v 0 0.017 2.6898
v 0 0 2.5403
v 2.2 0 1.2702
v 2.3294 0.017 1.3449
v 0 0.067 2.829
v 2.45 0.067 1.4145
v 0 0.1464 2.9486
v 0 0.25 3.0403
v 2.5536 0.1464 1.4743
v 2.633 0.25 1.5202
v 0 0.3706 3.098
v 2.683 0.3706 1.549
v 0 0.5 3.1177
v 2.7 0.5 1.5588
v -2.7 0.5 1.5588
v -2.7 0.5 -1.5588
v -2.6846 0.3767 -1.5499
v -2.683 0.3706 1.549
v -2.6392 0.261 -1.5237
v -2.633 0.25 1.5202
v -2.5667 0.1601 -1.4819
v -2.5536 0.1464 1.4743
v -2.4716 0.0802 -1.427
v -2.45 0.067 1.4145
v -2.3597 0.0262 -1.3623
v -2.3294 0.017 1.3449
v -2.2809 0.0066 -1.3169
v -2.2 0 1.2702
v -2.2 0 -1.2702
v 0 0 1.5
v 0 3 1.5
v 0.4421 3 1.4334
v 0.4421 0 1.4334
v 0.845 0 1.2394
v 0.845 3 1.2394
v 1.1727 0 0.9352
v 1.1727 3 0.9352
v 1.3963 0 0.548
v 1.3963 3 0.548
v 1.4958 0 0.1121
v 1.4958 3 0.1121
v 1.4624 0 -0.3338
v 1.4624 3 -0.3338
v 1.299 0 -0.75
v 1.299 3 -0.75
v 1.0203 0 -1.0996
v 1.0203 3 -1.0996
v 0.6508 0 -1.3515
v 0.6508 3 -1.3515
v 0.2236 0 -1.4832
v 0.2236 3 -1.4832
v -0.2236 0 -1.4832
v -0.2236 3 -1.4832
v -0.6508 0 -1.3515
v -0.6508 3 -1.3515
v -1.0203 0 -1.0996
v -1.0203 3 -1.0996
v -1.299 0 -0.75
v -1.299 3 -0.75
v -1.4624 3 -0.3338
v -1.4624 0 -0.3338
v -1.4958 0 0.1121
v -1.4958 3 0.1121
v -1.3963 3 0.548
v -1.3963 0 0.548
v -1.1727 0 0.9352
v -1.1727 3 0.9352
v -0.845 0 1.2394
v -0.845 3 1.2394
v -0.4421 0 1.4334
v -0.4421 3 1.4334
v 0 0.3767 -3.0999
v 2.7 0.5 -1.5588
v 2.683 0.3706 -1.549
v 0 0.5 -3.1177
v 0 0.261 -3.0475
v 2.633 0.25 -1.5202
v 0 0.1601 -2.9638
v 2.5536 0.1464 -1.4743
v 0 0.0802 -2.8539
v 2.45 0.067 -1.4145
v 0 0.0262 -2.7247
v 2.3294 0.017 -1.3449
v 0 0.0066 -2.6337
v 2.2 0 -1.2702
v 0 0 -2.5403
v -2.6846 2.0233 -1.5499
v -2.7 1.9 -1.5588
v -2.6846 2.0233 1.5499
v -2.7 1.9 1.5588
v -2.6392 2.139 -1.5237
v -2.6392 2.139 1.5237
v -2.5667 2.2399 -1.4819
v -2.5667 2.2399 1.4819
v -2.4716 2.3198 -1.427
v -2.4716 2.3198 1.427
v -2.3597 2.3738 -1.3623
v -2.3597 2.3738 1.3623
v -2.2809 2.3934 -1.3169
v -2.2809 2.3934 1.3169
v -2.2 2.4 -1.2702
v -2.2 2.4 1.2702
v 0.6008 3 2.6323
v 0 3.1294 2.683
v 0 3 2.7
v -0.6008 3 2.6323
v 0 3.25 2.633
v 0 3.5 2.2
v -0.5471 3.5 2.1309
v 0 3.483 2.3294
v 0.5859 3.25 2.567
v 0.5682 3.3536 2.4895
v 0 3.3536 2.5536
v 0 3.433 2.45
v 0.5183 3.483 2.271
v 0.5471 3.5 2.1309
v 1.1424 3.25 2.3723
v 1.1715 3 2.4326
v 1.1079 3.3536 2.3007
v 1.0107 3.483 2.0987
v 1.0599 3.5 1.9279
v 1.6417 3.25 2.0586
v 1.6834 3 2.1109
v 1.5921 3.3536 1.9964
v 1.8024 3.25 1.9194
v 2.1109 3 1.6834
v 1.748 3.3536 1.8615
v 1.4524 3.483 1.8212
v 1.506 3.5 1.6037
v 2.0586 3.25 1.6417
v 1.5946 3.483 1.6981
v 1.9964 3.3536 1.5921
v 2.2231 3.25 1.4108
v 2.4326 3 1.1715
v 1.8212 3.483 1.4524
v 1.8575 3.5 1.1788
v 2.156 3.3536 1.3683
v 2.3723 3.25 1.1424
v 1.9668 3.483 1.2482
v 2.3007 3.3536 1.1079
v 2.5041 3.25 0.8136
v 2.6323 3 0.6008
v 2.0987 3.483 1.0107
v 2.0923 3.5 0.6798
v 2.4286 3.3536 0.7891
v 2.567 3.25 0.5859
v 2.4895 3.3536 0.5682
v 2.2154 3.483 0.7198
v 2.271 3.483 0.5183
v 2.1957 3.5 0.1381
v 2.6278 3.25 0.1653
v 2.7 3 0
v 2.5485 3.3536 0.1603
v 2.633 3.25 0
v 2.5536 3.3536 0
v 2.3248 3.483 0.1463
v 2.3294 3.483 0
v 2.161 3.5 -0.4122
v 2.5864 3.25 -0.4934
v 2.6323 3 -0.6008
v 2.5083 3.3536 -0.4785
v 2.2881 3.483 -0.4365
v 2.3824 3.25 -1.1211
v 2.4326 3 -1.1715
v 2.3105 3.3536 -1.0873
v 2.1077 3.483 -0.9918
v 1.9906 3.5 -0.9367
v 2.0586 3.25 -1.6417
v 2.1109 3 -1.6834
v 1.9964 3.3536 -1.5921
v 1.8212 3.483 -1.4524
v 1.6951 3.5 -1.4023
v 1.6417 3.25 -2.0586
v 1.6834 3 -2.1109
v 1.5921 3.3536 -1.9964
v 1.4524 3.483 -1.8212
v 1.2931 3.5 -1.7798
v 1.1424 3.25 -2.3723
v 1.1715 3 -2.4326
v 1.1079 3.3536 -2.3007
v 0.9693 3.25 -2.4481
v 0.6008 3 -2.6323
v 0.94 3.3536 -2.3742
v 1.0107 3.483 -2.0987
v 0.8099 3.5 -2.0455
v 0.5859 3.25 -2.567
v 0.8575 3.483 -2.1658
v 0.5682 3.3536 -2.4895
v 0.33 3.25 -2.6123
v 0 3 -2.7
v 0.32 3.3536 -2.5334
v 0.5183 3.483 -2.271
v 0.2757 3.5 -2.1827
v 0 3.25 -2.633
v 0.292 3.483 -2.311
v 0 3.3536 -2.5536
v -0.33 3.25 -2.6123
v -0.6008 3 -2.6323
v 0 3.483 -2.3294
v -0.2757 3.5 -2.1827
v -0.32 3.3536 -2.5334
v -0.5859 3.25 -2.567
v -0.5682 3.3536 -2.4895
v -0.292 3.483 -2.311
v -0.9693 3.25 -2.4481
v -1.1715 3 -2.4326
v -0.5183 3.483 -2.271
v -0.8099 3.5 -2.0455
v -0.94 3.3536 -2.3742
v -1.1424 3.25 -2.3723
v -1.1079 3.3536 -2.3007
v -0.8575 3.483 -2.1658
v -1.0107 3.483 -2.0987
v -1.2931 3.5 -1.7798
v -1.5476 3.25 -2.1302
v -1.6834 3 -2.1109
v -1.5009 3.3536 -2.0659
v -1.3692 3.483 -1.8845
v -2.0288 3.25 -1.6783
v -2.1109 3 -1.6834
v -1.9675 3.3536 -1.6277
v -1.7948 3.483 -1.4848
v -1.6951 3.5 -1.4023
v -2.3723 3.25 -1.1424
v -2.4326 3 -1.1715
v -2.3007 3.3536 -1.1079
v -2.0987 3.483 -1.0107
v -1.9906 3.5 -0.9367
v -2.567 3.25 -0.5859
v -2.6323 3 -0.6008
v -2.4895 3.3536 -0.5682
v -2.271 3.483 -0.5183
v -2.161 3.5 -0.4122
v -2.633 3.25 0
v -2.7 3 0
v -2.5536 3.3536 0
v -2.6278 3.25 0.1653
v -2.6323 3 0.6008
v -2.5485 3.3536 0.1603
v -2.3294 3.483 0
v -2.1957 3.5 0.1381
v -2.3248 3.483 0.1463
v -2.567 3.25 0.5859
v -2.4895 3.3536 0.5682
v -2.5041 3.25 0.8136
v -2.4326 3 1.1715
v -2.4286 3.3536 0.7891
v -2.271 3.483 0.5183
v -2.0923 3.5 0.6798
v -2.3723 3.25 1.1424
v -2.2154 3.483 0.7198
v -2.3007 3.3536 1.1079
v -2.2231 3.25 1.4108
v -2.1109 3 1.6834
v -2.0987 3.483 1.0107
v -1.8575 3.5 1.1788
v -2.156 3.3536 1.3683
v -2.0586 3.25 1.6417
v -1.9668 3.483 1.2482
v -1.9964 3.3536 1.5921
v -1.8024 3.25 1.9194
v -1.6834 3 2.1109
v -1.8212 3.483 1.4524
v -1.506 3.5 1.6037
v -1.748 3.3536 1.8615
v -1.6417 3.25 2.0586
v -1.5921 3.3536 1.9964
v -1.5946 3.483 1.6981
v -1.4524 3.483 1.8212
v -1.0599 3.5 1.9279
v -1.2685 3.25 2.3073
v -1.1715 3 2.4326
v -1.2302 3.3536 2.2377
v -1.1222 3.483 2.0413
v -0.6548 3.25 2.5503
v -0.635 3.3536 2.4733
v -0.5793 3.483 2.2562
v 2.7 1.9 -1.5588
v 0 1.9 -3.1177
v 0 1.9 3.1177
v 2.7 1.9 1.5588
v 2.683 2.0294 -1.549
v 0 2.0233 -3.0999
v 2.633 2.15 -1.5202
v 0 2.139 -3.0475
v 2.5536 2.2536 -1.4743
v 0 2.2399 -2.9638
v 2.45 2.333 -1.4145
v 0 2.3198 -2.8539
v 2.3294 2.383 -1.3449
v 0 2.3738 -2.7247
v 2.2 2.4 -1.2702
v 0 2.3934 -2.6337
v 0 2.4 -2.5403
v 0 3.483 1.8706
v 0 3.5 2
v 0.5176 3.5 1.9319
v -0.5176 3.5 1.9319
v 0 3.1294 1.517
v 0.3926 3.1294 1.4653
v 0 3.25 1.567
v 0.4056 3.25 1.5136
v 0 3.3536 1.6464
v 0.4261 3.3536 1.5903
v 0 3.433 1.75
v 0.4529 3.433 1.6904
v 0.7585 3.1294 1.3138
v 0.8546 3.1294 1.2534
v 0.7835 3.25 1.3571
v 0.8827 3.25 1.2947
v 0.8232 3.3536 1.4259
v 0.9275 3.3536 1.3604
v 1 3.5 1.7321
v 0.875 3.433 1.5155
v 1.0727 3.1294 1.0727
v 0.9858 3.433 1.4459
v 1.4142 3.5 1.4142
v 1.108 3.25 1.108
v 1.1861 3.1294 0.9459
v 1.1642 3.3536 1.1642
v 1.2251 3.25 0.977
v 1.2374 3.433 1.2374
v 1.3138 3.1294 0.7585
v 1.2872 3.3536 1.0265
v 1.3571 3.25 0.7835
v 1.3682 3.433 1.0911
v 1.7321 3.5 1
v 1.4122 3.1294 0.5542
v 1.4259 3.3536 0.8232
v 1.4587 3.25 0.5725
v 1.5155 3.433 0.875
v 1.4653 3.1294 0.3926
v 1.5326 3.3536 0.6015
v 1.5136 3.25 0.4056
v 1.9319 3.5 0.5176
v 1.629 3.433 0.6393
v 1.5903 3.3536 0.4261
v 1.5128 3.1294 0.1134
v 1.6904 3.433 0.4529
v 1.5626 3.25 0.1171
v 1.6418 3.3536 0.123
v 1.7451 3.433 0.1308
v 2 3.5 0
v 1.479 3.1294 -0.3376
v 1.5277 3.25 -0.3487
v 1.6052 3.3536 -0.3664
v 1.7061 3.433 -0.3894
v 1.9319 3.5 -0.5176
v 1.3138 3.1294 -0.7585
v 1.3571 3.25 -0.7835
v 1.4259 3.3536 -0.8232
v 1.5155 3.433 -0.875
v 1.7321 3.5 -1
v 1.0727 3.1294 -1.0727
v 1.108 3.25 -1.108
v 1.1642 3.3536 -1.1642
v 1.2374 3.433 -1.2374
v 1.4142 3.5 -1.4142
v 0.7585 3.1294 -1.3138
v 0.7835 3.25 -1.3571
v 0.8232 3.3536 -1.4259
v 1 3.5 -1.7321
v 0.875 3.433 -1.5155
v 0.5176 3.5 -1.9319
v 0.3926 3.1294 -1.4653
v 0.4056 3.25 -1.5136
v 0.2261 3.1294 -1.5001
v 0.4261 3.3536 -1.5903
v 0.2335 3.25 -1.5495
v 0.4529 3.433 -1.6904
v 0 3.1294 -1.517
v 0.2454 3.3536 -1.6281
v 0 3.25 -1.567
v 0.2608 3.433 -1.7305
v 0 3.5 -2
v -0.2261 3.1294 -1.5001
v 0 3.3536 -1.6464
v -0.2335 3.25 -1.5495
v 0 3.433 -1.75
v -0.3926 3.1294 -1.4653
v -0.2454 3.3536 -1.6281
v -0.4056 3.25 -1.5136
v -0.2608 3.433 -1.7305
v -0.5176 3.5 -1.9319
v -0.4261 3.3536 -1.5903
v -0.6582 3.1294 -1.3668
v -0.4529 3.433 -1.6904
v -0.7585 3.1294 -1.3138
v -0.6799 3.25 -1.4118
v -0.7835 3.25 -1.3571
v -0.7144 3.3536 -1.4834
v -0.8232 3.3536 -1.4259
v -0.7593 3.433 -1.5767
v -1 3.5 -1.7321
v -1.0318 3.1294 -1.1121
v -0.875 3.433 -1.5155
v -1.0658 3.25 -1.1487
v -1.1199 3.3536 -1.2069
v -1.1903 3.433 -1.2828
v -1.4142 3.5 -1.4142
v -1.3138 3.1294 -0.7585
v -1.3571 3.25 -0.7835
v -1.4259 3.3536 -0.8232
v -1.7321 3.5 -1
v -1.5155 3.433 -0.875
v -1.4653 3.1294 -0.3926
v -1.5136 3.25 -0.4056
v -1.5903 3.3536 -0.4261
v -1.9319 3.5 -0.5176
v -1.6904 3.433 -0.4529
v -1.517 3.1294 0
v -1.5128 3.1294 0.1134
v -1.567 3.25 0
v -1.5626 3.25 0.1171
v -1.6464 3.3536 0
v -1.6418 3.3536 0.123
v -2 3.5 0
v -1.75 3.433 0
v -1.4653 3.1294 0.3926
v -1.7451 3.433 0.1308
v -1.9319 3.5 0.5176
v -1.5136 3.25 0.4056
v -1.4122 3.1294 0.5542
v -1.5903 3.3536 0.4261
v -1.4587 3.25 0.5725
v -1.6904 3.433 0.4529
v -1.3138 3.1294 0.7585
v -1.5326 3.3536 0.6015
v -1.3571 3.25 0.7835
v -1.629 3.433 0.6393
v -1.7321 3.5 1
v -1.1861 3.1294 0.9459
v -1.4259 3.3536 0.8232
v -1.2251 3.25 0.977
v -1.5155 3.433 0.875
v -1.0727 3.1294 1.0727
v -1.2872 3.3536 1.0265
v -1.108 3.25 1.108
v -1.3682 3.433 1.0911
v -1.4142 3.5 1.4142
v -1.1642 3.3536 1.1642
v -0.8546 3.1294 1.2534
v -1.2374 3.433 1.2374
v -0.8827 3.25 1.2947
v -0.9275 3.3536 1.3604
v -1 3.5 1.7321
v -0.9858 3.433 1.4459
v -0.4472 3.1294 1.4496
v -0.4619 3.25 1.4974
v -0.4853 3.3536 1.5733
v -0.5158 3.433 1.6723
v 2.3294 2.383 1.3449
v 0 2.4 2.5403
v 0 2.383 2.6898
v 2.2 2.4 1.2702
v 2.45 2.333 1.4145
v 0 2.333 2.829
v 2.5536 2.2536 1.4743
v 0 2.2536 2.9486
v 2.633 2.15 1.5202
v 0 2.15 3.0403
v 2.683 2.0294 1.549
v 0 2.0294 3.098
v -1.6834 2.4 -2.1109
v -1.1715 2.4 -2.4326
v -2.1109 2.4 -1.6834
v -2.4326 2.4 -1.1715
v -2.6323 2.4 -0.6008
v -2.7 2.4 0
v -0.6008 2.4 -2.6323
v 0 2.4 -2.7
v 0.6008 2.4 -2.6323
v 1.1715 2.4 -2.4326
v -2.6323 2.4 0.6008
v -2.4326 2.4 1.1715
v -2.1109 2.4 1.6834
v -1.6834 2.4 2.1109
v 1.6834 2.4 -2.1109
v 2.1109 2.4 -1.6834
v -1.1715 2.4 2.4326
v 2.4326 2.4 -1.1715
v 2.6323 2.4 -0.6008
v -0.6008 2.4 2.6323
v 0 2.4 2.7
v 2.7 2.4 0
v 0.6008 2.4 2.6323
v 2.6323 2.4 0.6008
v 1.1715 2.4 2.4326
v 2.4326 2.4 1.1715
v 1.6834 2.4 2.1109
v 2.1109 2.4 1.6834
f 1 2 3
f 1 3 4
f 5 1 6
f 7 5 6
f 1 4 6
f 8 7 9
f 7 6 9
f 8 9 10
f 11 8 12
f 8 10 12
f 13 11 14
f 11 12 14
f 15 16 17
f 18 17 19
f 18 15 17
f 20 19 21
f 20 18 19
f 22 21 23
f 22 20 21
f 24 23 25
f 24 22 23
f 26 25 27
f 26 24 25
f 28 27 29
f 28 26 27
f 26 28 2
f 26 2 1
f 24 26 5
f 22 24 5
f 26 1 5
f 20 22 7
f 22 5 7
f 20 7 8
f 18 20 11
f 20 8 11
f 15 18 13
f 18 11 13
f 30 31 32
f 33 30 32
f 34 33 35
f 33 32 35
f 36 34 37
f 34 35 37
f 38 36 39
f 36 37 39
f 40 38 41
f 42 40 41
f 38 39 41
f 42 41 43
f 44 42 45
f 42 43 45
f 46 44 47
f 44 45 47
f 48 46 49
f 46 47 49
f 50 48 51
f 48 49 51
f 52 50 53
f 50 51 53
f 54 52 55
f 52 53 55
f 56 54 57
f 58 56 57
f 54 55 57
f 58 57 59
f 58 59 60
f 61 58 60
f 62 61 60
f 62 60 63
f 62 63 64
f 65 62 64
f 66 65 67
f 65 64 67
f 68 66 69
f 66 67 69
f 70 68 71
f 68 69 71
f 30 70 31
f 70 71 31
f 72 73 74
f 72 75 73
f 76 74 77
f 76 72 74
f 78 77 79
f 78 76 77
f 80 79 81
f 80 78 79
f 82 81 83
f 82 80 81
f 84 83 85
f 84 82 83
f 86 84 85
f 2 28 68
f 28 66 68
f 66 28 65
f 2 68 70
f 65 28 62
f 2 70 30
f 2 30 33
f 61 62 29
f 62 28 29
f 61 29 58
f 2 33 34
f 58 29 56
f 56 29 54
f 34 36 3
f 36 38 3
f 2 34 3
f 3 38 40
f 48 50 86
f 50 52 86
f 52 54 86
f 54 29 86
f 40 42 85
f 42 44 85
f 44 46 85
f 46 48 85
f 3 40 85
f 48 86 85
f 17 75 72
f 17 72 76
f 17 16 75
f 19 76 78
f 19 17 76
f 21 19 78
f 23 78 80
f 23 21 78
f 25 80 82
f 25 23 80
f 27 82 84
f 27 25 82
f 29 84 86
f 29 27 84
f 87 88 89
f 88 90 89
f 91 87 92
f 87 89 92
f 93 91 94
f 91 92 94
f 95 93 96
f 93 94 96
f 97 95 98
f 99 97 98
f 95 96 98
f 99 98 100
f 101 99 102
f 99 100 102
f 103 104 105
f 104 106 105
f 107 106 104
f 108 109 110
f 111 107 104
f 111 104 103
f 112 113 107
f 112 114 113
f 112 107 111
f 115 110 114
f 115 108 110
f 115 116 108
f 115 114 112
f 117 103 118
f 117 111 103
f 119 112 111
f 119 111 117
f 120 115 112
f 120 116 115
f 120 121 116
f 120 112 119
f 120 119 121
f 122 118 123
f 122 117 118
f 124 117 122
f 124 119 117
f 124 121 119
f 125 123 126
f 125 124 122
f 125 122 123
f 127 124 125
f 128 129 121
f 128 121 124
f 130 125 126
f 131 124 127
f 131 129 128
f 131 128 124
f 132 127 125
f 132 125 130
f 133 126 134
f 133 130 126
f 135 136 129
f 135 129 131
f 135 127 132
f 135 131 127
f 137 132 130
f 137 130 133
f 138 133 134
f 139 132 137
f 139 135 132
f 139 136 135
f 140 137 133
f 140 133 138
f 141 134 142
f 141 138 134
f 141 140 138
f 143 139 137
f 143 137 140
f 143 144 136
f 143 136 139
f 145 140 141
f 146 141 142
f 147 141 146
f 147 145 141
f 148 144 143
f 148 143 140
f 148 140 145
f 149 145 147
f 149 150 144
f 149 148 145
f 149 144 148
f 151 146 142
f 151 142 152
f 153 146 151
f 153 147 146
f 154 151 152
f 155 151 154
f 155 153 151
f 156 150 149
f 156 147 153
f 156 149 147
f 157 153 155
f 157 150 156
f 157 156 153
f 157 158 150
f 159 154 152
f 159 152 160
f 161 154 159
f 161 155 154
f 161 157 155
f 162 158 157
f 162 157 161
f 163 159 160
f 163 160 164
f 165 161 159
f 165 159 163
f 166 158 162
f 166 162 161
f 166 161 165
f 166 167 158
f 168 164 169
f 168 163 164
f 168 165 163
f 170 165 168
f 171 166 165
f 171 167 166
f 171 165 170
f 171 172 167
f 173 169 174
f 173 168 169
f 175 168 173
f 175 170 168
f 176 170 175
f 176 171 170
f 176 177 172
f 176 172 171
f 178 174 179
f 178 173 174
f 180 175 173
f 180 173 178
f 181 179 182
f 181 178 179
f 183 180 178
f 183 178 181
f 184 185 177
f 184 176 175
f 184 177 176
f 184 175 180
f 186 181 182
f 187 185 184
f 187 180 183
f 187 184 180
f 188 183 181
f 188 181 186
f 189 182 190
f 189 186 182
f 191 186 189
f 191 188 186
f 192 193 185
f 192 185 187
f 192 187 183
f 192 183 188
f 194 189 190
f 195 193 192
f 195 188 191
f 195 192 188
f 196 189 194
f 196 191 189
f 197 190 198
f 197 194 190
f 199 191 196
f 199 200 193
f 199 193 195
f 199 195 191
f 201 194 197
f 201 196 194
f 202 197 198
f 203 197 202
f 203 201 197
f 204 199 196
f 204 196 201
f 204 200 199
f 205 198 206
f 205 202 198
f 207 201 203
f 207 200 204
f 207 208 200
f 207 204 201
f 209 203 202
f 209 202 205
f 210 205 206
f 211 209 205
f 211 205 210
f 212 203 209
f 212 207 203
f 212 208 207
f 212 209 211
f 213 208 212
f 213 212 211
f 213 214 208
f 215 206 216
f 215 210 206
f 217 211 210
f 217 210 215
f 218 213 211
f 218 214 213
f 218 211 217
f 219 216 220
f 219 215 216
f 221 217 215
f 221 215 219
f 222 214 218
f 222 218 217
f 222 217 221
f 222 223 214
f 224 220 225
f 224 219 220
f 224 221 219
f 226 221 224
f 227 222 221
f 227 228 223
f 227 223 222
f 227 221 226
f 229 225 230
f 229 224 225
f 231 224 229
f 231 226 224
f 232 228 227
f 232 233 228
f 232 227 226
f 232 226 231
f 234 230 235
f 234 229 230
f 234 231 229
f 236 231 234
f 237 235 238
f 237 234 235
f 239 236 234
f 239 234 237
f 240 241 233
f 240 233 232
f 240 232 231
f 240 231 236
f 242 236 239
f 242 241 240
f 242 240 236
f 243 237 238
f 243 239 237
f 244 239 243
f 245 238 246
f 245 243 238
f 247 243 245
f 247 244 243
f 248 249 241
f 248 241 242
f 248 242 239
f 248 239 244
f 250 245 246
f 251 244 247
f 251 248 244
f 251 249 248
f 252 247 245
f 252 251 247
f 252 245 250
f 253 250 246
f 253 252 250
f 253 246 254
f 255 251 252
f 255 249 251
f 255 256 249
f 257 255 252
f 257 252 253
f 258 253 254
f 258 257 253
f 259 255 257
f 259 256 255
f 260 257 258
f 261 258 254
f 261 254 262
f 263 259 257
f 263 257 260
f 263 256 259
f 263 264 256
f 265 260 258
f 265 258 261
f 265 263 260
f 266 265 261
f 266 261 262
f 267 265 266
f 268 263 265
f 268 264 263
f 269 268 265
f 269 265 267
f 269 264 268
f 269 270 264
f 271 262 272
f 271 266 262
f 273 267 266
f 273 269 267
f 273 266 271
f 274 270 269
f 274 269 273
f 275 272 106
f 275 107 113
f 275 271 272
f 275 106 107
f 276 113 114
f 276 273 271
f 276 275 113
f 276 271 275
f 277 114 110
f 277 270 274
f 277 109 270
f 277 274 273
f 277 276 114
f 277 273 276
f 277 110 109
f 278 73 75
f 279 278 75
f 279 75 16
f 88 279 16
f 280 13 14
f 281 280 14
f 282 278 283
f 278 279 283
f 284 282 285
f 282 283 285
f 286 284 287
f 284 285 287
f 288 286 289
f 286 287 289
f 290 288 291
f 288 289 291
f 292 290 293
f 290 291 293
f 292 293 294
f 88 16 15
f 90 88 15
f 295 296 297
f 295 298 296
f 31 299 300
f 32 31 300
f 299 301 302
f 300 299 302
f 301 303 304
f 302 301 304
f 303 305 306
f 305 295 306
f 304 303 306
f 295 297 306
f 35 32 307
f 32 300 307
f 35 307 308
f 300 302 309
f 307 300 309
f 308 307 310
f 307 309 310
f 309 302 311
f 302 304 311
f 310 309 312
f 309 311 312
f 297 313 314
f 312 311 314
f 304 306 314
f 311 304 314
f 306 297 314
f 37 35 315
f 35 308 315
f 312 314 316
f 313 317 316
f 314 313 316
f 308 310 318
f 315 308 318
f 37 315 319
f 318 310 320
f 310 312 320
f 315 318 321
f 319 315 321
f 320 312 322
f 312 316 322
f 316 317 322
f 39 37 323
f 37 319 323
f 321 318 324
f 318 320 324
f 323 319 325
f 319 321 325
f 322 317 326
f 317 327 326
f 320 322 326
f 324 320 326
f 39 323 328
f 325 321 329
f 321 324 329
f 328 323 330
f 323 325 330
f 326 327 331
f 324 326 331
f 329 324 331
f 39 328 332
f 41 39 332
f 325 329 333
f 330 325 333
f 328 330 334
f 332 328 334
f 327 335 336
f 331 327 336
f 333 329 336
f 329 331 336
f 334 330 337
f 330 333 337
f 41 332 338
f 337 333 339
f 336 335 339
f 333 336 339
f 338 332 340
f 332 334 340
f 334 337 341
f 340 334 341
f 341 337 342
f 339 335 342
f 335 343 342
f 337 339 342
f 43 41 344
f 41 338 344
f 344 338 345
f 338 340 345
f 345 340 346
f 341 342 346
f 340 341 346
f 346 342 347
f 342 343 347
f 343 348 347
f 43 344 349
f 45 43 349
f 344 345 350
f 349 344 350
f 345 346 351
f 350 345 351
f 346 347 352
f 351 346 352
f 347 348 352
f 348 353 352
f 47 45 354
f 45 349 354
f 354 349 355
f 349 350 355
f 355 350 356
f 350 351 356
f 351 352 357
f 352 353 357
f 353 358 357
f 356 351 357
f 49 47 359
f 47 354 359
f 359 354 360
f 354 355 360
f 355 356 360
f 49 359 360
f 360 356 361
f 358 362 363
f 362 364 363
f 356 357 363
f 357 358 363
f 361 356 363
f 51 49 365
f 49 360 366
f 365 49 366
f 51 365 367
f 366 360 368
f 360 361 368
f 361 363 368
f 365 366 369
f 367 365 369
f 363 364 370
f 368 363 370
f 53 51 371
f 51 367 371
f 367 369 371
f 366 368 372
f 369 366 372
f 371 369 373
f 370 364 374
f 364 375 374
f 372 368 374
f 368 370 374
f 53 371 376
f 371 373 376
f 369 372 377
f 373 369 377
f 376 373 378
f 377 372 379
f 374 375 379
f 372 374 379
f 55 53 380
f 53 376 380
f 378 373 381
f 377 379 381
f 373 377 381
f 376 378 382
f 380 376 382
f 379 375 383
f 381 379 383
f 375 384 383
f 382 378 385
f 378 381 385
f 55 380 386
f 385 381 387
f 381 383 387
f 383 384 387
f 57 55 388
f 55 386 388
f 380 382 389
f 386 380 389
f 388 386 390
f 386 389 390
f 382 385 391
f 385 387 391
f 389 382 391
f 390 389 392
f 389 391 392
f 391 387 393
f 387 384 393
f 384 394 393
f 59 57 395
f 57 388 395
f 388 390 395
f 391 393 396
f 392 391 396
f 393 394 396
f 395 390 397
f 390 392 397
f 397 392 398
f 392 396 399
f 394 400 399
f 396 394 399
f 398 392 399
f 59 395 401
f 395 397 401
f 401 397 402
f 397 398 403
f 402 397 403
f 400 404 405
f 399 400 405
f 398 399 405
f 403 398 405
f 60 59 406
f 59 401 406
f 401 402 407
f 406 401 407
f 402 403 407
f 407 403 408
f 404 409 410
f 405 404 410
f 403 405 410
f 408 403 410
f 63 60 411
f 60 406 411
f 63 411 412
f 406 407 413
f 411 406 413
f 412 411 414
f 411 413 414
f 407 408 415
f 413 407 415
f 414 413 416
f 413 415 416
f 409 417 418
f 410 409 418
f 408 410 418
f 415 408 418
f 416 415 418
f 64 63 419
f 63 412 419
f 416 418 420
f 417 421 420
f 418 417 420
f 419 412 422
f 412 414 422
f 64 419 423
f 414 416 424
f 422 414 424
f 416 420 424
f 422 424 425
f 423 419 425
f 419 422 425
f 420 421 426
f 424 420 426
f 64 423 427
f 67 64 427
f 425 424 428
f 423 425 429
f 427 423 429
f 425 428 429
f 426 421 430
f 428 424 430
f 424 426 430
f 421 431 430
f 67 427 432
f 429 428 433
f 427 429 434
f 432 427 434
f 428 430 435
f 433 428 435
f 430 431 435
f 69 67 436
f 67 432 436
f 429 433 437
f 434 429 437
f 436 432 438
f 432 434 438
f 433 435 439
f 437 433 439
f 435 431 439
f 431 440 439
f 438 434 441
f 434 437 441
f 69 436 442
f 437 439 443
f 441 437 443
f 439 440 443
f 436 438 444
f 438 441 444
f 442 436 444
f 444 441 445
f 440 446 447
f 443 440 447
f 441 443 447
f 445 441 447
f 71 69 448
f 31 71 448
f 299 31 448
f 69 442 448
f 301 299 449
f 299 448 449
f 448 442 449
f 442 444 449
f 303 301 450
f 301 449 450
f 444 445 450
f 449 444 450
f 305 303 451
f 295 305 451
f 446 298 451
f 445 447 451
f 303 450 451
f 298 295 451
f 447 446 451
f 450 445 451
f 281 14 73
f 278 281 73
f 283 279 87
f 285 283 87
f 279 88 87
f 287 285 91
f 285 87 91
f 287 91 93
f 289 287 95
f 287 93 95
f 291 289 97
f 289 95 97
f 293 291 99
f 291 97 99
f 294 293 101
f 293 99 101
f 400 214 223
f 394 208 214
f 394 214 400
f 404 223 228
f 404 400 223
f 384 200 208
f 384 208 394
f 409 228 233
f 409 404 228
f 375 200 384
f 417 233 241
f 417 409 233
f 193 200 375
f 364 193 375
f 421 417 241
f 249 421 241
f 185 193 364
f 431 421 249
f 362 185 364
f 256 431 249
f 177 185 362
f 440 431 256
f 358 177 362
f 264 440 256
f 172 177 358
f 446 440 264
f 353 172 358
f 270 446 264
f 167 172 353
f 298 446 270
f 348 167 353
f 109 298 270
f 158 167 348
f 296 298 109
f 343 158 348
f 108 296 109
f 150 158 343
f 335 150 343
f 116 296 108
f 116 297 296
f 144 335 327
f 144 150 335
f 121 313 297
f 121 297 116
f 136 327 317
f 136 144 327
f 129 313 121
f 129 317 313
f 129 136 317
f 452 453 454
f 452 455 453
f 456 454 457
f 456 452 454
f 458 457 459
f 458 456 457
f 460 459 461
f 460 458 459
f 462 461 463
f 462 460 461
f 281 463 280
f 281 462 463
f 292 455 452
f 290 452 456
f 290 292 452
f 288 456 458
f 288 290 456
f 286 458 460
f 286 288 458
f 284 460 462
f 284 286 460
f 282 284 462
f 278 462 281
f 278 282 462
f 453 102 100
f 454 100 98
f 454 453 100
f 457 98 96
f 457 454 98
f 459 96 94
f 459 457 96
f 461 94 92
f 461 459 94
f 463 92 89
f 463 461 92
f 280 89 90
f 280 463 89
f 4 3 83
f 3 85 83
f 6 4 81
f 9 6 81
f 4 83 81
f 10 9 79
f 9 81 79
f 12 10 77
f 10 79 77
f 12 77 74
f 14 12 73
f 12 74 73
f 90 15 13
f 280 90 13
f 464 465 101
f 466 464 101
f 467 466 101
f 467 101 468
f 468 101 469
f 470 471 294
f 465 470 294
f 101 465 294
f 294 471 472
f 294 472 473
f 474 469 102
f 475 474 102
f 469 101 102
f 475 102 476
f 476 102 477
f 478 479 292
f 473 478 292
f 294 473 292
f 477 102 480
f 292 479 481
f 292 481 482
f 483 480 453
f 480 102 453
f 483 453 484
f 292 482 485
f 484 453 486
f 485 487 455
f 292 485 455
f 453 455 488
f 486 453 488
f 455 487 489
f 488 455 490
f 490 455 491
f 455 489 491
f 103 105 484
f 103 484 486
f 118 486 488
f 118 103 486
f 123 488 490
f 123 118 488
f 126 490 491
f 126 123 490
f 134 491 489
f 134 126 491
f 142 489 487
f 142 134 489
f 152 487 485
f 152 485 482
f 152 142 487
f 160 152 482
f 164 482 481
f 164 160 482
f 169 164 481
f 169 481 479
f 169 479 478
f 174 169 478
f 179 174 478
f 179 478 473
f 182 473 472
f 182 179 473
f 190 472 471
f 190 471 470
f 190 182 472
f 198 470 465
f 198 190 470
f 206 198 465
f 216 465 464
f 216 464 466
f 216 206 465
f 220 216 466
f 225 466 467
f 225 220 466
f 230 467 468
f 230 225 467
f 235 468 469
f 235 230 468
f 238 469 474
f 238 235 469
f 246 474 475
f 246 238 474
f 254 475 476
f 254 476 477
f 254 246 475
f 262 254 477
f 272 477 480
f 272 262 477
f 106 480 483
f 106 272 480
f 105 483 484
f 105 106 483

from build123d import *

# Parameters (mm, degrees)
EXTRUDE_1_DEPTH     = 2.4
SKETCH_2_R          = 1.5
CUT_EXTRUDE_1_DEPTH = 10
FILLET_1_R          = 0.5
EXTRUDE_START       = 1.1
SKETCH_3_R          = 2.7
SKETCH_3_R_2        = 1.5
EXTRUDE_2_DEPTH     = 1.1
FILLET_2_R          = 0.5


with BuildPart() as part:
    # 草图1 → 凸台-拉伸1 (new body)
    with BuildSketch(Plane(origin=(0, 0, 0), x_dir=(1, 0, 0), z_dir=(0, 1, 0))):
        Polygon((0, 3.117691454), (-2.7, 1.558845727), (-2.7, -1.558845727), (0, -3.117691454), (2.7, -1.558845727), (2.7, 1.558845727), align=None)
    extrude(amount=EXTRUDE_1_DEPTH)

    # 草图2 → 切除-拉伸1 (cut)
    with BuildSketch(Plane(origin=(0, 2.4, 0), x_dir=(1, 0, 0), z_dir=(0, 1, 0))):
        with Locations(Location((0, 0, 0), (0, 0, 270))):
            Circle(SKETCH_2_R)
    extrude(amount=-CUT_EXTRUDE_1_DEPTH, mode=Mode.SUBTRACT)

    # 圆角1
    fillet_1_edges = [part.edges().sort_by_distance(p)[0] for p in [
        (-2.7, 2.4, 0),
        (-1.35, 2.4, 2.33826859),
        (1.35, 2.4, 2.33826859),
        (2.7, 2.4, 0),
        (1.35, 2.4, -2.33826859),
        (2.7, 0, 0),
        (1.35, 0, 2.33826859),
        (-1.35, 0, 2.33826859),
        (-2.7, 0, 0),
        (-1.35, 0, -2.33826859),
        (1.35, 0, -2.33826859),
        (-1.35, 2.4, -2.33826859),
    ]]
    fillet(fillet_1_edges, radius=FILLET_1_R)

    # 草图3 → 凸台-拉伸2 (add)
    with BuildSketch(Plane(origin=(0, 2.4, 0), x_dir=(1, 0, 0), z_dir=(0, 1, 0)).offset(EXTRUDE_START)):
        with Locations(Location((0, 0, 0), (0, 0, 270))):
            Circle(SKETCH_3_R)
        with Locations(Location((0, 0, 0), (0, 0, 270))):
            Circle(SKETCH_3_R_2, mode=Mode.SUBTRACT)
    extrude(amount=-EXTRUDE_2_DEPTH)

    # 圆角2
    fillet_2_edges = [part.edges().sort_by_distance(p)[0] for p in [
        (0, 3.5, -2.7),
        (0, 3.5, -1.5),
    ]]
    fillet(fillet_2_edges, radius=FILLET_2_R)


solid = part.part
